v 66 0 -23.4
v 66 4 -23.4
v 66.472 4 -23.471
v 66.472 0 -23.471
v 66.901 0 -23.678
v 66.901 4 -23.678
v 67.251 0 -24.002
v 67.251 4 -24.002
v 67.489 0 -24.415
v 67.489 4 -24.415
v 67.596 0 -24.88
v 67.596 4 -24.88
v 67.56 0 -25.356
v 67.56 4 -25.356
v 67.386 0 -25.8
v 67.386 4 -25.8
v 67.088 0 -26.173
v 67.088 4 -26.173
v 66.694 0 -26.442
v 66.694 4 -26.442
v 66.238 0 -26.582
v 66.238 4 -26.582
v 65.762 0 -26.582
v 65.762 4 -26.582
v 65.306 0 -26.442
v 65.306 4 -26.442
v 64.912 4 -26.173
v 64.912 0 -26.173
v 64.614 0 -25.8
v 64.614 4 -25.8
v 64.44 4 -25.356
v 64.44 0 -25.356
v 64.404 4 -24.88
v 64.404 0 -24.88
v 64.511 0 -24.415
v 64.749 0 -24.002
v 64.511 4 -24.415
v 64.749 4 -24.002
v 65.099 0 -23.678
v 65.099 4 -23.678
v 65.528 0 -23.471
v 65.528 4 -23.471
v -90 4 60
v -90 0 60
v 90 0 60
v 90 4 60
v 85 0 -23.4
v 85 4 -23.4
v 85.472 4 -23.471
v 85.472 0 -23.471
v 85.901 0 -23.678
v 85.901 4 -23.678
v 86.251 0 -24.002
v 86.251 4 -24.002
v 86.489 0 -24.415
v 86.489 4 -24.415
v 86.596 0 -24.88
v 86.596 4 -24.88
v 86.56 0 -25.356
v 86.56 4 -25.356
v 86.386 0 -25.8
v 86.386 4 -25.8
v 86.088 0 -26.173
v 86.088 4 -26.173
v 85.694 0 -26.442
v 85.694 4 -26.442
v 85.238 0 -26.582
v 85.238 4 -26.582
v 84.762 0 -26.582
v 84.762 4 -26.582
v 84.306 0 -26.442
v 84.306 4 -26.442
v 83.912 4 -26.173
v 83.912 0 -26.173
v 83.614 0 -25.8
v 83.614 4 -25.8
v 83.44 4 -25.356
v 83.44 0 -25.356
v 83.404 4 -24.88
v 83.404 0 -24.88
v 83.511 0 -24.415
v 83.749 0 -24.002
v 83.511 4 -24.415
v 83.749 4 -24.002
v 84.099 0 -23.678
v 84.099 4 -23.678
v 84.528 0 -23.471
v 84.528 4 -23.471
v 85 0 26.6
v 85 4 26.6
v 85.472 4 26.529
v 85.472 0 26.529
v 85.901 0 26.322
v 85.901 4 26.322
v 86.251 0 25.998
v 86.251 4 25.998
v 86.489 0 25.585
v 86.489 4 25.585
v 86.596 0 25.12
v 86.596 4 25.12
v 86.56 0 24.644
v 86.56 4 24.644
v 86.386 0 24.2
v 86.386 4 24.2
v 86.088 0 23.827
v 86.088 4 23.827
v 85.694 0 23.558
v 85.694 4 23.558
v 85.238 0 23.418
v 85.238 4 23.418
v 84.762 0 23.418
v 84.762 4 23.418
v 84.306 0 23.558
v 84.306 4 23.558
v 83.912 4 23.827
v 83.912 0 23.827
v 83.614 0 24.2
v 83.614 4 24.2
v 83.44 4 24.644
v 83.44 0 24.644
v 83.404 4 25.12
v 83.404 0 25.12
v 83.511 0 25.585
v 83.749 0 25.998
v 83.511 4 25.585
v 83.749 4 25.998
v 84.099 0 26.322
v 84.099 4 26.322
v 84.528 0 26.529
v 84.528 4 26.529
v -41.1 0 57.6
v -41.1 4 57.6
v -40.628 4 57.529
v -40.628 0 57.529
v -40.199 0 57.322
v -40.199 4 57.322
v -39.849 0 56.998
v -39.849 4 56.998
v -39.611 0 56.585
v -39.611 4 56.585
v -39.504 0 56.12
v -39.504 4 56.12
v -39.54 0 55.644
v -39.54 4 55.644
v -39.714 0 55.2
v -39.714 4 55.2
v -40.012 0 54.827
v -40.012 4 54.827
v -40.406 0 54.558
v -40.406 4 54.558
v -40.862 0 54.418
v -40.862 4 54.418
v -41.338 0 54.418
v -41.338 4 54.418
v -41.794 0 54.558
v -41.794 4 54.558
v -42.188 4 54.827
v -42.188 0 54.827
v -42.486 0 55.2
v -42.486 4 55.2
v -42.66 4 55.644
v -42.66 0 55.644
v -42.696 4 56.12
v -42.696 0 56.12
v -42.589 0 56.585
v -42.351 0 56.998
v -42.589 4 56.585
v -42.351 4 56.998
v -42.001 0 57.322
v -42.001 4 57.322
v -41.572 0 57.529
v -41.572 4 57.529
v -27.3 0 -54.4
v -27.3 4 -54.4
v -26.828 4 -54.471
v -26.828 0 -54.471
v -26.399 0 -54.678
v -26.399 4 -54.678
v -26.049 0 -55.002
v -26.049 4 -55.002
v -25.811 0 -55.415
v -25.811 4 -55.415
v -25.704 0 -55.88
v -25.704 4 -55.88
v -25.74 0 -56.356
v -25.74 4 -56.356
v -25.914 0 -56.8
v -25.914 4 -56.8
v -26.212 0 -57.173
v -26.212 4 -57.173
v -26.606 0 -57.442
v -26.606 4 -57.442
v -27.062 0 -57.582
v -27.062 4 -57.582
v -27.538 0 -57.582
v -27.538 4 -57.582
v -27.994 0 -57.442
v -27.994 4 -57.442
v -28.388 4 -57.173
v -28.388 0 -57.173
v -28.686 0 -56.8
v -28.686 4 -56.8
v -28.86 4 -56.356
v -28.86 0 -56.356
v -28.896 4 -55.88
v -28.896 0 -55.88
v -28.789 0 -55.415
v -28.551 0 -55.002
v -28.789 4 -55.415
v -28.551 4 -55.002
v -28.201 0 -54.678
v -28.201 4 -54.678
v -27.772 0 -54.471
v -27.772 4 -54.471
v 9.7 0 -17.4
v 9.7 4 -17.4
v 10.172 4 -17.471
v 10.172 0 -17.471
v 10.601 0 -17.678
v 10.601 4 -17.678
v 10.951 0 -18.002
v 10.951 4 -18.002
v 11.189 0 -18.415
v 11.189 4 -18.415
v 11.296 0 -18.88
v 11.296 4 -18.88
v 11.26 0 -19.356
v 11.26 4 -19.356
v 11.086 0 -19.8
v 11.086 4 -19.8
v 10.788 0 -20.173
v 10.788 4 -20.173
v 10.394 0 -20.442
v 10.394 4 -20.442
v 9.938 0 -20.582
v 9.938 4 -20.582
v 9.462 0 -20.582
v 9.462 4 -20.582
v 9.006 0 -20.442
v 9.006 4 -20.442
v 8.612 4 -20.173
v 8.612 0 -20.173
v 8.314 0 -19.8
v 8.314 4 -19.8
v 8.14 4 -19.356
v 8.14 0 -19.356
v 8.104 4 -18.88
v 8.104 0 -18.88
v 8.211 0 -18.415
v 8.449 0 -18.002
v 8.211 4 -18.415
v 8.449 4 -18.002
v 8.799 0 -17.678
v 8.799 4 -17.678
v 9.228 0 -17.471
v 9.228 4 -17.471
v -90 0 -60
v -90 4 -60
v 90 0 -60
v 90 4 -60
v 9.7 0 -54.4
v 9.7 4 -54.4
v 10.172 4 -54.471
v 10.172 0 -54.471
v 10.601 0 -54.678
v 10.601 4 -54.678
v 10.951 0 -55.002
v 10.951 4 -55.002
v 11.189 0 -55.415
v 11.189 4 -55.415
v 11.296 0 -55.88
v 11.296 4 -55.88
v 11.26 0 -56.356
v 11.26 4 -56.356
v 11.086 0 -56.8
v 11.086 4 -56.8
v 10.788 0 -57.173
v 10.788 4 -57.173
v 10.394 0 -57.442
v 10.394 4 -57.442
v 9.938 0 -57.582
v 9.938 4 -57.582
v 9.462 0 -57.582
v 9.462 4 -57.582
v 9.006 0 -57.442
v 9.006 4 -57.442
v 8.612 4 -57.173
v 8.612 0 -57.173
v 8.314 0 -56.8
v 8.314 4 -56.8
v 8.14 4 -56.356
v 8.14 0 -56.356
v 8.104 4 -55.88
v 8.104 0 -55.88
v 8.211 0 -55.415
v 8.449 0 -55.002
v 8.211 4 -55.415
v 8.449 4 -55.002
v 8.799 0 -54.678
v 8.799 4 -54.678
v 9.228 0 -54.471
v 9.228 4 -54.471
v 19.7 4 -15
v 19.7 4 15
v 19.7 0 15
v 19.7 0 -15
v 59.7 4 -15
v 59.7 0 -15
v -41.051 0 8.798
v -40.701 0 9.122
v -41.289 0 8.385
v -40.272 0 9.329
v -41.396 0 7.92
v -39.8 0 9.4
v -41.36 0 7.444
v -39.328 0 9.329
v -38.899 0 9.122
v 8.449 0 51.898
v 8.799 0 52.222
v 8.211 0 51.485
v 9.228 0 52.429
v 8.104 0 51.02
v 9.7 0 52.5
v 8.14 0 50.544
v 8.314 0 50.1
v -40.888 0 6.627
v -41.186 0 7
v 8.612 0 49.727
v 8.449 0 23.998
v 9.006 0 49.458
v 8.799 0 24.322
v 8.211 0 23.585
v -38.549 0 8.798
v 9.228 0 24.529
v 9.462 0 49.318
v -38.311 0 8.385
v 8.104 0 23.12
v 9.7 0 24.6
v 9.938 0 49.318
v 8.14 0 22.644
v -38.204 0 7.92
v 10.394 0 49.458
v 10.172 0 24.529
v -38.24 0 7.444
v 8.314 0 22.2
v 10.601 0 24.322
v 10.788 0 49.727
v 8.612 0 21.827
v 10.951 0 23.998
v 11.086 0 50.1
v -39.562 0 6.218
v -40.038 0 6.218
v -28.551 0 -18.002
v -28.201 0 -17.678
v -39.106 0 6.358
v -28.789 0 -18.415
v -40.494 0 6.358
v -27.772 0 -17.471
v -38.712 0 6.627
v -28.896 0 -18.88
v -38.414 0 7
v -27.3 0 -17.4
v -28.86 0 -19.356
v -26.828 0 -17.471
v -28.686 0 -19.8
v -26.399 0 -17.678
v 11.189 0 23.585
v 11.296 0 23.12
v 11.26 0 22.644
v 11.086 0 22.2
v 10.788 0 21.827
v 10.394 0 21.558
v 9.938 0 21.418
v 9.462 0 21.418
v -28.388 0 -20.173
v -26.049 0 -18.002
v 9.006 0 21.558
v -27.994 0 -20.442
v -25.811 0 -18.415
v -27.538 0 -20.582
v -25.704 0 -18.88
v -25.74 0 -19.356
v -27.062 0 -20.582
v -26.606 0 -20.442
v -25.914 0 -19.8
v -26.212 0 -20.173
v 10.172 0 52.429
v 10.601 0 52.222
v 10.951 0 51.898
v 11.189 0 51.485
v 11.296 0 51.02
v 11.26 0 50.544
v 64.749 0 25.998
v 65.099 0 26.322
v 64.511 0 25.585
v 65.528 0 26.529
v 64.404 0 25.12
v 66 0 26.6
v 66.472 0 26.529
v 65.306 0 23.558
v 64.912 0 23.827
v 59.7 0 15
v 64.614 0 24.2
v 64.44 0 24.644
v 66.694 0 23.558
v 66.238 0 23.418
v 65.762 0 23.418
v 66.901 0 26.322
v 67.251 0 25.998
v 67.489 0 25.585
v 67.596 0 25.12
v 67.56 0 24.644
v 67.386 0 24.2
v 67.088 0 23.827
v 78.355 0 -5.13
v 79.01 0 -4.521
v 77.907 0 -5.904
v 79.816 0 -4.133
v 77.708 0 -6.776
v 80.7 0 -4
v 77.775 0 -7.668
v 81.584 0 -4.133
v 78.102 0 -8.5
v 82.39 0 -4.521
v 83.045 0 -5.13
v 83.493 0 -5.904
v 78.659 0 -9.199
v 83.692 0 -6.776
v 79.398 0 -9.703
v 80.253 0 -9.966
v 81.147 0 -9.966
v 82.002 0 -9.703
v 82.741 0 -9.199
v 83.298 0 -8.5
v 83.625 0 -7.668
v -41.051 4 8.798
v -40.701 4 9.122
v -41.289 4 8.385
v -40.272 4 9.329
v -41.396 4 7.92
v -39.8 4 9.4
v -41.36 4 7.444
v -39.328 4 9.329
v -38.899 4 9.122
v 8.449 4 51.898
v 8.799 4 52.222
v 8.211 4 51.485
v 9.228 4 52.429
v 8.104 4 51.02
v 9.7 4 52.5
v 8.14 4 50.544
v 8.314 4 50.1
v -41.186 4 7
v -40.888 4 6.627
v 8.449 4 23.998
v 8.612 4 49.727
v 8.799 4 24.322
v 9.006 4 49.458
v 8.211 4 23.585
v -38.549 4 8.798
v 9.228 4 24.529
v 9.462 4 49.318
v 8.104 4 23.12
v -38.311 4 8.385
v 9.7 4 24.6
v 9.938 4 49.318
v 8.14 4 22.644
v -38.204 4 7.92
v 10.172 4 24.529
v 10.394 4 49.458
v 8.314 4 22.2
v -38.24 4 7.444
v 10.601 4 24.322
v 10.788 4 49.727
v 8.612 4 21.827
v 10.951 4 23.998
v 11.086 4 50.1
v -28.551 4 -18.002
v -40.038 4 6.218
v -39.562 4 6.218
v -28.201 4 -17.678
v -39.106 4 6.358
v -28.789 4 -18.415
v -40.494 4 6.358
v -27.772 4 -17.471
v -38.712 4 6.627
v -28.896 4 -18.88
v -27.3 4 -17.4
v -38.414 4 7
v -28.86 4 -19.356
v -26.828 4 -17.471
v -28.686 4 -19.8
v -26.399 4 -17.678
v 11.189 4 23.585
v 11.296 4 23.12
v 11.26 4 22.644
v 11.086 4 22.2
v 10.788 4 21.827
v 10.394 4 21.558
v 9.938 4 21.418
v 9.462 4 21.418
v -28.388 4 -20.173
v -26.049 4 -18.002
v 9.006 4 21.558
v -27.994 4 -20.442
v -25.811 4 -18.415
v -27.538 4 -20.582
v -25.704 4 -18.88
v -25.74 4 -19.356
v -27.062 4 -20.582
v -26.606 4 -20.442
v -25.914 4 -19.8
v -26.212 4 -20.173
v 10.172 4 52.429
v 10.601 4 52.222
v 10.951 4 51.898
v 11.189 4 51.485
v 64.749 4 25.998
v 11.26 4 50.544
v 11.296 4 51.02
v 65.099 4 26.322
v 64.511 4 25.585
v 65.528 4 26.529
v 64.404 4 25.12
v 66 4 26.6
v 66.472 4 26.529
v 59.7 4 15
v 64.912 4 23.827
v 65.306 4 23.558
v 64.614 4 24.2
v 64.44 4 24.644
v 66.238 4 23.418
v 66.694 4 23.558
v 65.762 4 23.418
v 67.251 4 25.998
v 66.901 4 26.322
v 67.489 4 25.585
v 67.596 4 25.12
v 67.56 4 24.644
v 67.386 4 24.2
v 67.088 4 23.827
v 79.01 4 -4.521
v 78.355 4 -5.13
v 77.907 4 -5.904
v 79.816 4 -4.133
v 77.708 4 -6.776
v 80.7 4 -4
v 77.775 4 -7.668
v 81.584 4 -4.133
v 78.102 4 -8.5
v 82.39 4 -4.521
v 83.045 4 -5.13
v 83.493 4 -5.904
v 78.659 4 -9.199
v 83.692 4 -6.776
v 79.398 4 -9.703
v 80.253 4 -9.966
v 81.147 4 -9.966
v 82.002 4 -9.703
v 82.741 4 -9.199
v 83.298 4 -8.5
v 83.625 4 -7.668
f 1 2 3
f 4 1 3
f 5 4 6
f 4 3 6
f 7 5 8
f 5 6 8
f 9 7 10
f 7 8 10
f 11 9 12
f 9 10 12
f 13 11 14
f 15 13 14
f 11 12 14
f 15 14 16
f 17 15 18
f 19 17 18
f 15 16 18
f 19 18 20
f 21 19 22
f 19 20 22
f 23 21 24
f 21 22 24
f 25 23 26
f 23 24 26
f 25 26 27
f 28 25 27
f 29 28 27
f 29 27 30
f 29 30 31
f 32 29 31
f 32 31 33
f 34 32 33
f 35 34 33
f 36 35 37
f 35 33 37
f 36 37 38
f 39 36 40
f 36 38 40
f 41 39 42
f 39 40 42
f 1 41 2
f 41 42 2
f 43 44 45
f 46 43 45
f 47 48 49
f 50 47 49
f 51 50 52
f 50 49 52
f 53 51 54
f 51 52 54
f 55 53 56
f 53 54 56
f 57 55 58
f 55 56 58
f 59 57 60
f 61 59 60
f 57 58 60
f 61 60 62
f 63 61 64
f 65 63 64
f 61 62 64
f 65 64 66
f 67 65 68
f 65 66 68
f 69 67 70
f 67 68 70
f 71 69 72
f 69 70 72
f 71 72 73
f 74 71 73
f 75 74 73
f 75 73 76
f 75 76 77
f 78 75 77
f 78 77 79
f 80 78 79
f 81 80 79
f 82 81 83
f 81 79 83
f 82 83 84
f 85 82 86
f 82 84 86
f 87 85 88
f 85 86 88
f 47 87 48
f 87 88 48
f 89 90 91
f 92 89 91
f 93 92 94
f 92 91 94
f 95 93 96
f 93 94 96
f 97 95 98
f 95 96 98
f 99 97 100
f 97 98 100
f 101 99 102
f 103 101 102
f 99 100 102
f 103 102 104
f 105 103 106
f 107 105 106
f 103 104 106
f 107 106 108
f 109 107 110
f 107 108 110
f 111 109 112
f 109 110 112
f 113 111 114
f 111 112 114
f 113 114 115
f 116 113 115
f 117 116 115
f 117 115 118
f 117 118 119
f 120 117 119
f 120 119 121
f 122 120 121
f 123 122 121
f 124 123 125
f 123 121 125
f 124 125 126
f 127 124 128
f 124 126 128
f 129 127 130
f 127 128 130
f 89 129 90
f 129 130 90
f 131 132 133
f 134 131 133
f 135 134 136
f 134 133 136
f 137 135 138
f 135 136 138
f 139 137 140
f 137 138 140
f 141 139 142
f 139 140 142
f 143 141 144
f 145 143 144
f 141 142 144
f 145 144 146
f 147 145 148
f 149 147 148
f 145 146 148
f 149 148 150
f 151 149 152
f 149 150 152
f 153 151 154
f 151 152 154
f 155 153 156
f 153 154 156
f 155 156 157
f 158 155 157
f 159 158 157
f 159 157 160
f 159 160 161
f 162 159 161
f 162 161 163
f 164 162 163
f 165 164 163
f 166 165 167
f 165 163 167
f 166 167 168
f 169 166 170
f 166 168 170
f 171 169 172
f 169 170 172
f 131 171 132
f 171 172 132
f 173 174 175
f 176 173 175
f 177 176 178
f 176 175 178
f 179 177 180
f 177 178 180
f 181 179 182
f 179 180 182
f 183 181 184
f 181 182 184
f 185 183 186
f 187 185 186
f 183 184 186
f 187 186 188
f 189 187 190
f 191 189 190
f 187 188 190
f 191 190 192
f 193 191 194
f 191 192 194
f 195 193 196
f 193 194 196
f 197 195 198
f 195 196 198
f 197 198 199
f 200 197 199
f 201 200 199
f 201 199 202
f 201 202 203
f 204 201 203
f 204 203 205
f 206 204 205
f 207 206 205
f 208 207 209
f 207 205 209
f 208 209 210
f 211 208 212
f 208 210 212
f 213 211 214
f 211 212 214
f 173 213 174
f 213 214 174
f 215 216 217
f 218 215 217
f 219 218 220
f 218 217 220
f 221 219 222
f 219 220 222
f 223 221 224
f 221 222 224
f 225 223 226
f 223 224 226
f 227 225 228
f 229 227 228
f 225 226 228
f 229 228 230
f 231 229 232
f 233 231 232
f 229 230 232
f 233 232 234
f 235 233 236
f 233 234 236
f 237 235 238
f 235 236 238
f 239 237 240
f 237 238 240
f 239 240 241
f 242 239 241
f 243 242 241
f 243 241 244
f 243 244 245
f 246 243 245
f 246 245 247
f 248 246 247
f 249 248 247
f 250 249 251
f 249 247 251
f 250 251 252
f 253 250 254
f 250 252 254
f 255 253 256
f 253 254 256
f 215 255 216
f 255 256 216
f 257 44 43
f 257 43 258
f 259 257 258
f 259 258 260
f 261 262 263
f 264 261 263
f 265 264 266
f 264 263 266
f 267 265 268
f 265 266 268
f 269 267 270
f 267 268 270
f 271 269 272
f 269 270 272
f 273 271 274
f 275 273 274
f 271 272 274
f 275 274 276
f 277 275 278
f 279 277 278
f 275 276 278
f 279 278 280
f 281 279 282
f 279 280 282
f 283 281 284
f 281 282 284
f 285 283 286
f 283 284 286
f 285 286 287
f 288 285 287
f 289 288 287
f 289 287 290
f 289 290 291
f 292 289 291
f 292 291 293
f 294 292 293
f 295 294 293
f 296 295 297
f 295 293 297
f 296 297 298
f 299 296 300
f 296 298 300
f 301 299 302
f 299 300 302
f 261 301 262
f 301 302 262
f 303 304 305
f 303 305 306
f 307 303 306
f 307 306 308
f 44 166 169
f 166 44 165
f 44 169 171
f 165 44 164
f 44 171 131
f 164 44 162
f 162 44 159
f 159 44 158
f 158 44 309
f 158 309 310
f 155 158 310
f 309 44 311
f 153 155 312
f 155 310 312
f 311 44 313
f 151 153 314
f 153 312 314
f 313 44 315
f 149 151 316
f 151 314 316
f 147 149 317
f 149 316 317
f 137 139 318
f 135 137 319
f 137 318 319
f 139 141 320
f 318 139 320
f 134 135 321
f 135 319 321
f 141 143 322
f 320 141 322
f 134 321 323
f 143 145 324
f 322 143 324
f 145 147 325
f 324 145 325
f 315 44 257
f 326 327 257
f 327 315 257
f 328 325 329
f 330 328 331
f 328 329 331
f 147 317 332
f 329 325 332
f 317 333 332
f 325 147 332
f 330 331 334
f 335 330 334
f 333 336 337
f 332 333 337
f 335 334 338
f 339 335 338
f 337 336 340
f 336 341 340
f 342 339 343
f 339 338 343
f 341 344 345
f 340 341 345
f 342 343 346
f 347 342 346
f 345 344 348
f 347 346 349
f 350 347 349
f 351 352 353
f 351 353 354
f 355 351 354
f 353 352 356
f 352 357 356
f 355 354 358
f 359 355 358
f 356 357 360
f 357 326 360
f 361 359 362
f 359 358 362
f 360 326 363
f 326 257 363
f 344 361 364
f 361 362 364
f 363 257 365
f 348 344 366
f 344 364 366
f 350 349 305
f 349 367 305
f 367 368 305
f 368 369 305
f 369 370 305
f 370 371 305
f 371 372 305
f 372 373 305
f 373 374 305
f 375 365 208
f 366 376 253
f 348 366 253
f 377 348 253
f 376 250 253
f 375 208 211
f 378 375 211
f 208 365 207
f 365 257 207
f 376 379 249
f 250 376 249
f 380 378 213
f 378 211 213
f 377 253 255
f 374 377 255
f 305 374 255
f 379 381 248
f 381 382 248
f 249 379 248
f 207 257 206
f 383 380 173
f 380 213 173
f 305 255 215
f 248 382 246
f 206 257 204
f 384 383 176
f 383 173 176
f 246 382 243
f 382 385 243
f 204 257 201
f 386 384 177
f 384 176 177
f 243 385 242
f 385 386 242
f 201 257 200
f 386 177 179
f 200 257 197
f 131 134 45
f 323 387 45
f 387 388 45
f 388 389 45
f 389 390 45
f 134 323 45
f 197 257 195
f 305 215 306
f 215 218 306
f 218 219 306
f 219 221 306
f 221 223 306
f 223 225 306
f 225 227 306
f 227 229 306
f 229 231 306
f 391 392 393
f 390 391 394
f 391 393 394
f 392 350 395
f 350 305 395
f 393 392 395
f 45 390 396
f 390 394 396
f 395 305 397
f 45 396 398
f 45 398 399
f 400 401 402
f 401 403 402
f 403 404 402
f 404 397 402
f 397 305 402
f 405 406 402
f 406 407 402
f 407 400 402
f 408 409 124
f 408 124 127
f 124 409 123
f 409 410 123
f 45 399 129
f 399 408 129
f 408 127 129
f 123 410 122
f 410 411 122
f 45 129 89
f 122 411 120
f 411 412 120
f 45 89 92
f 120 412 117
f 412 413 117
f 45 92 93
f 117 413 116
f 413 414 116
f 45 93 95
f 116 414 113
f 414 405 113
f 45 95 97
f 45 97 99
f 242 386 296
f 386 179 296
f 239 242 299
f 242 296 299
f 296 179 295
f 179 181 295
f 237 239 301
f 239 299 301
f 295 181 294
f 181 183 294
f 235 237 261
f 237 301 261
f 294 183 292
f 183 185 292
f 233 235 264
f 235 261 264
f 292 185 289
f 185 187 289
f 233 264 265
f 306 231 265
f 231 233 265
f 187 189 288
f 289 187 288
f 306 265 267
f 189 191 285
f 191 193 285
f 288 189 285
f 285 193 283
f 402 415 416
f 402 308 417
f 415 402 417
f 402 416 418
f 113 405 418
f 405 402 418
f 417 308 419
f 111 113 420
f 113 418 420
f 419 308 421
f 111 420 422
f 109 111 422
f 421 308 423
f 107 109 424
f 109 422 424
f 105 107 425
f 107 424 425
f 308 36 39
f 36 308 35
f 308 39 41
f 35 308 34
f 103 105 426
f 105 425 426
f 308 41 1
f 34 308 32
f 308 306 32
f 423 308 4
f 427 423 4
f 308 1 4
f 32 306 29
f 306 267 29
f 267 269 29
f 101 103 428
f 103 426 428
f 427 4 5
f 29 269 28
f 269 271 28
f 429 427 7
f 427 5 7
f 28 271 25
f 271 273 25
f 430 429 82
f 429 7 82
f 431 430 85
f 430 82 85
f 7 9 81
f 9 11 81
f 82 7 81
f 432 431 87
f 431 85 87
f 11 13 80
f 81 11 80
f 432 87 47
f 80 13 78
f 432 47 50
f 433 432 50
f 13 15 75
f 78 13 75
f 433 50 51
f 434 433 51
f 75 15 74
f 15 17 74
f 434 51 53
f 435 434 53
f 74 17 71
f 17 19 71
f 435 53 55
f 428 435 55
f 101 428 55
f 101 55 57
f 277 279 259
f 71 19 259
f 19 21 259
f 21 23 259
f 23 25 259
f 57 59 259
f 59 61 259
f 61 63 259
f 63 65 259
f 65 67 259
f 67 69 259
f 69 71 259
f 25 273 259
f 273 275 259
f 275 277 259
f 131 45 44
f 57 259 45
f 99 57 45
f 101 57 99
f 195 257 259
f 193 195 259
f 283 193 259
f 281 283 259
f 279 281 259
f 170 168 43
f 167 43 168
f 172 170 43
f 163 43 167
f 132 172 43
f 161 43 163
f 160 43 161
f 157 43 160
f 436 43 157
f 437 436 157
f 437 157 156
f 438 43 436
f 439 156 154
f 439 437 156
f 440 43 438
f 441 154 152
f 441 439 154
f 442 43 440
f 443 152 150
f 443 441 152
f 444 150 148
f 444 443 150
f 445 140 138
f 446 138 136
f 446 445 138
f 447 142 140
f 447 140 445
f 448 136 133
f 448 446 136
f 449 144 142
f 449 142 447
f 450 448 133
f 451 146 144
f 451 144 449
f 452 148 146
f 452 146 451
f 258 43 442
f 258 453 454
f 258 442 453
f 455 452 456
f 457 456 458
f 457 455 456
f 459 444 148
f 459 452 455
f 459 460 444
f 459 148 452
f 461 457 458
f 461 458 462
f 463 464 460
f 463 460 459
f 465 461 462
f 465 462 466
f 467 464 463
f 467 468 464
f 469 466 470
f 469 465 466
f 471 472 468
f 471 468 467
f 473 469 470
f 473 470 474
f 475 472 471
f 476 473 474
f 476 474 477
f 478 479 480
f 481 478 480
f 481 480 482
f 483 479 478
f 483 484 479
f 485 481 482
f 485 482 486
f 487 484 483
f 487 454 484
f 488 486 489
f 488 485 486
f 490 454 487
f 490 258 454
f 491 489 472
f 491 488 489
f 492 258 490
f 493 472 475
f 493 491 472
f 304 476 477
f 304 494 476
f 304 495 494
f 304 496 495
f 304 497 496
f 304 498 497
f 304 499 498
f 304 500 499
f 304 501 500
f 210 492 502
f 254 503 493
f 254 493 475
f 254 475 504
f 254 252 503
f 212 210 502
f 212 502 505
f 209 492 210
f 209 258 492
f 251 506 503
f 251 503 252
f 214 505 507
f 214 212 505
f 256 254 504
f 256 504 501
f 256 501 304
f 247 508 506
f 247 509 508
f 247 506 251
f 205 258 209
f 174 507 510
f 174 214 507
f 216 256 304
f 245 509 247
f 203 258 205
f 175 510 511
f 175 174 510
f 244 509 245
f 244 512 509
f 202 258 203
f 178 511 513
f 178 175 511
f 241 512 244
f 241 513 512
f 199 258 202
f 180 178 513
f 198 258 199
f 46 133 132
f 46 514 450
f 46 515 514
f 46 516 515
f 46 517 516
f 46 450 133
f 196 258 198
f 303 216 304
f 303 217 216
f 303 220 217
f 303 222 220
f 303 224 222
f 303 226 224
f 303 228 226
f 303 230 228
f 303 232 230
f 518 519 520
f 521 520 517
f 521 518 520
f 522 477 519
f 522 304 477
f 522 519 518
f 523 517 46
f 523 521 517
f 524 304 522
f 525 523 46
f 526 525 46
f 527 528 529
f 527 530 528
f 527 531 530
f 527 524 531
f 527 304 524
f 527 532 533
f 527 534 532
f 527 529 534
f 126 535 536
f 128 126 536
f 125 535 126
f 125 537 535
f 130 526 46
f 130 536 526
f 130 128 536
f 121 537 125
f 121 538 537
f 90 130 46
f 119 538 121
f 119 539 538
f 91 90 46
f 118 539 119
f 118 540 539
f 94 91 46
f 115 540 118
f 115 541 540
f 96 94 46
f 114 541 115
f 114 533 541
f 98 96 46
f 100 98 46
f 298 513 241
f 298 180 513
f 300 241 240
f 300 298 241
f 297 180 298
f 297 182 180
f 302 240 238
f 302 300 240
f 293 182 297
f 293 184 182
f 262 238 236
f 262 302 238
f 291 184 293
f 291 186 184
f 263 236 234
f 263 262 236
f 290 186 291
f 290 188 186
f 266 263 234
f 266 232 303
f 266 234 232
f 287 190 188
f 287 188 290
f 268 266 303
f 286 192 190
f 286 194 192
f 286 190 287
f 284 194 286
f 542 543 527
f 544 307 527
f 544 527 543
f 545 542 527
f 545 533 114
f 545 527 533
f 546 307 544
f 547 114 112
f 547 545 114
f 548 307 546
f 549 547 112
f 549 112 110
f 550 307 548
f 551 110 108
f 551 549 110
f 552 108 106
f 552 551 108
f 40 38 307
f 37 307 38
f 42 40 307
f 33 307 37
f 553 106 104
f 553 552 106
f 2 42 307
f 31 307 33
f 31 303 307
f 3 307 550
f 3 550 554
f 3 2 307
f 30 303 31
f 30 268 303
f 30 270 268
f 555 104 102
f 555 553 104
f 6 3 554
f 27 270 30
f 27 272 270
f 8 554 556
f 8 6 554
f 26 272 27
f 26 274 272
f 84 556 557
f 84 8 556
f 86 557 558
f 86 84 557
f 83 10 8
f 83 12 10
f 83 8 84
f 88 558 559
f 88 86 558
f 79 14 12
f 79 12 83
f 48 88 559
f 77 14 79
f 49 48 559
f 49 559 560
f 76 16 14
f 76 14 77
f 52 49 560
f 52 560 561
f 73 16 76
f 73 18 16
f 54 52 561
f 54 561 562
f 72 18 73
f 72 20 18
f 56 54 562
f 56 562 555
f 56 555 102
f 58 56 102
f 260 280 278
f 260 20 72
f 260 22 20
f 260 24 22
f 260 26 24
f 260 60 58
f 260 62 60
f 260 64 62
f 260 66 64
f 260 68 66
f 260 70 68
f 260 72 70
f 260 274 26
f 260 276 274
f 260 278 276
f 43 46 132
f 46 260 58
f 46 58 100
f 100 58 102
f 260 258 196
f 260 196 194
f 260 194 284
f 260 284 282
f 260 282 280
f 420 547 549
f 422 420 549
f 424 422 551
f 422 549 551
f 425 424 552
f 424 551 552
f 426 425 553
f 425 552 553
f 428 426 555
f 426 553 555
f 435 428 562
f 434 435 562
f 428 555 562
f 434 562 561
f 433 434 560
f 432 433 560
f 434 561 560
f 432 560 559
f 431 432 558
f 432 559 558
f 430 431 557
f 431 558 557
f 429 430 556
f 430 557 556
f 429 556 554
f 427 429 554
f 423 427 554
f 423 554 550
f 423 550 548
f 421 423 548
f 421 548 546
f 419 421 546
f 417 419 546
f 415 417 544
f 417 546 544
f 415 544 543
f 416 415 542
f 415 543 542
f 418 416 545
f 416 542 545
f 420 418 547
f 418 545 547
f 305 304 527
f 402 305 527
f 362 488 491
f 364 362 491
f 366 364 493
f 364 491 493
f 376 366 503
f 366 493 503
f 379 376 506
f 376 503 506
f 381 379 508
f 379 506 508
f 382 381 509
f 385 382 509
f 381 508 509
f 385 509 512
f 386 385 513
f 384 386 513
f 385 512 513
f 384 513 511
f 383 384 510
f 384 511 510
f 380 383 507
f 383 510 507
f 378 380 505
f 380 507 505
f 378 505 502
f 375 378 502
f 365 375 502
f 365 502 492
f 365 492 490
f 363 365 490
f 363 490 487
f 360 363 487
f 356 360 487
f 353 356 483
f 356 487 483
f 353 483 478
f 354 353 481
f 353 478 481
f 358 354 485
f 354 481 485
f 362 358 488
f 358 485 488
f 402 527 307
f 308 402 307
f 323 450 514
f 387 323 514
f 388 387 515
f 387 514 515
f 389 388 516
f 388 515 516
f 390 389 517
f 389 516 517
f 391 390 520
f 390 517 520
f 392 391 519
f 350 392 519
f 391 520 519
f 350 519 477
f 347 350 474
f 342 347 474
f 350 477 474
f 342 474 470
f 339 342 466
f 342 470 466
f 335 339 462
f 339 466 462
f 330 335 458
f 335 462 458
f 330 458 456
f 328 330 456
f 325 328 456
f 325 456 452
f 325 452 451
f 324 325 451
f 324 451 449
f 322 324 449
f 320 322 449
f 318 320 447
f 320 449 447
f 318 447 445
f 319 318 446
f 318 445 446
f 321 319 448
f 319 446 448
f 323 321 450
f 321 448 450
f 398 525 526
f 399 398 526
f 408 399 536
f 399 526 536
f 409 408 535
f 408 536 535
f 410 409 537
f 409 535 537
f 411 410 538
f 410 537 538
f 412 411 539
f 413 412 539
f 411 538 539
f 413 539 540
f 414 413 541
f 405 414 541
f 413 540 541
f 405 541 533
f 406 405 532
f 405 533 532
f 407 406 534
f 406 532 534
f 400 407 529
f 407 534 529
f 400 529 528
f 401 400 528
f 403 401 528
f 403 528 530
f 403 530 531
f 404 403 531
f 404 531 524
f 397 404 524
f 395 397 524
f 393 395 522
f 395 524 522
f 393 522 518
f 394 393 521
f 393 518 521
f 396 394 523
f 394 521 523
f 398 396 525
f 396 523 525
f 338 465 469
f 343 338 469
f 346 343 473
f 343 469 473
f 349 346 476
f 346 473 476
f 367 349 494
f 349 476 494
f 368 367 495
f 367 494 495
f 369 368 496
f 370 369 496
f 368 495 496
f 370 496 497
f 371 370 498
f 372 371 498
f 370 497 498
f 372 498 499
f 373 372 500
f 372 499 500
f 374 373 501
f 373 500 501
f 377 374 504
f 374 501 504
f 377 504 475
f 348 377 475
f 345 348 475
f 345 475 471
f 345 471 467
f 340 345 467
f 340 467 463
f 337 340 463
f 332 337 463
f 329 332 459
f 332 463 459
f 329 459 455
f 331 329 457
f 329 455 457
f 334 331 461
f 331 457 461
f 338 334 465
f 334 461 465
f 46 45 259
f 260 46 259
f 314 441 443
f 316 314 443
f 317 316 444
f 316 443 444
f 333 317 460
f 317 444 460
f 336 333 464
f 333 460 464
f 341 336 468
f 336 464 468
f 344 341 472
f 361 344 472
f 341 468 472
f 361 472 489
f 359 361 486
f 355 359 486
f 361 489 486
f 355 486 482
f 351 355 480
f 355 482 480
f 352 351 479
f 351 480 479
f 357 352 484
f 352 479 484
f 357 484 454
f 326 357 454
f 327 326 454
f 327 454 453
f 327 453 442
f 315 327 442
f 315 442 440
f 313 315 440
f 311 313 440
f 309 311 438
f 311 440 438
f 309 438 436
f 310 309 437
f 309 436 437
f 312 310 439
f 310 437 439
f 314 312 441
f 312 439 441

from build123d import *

# Parameters (mm, degrees)
SKETCH_1_W          = 180
SKETCH_1_H          = 120
EXTRUDE_1_DEPTH     = 4
SKETCH_2_R          = 1.6
SKETCH_2_R_2        = 3
CUT_EXTRUDE_1_DEPTH = 4
SKETCH_3_W          = 40
SKETCH_3_H          = 30
CUT_EXTRUDE_2_DEPTH = 4
SKETCH_4_R          = 1.6
CUT_EXTRUDE_3_DEPTH = 4
SKETCH_5_R          = 1.6
CUT_EXTRUDE_4_DEPTH = 4


with BuildPart() as part:
    # 草图1 → 凸台-拉伸1 (new body)
    with BuildSketch(Plane(origin=(0, 0, 0), x_dir=(1, 0, 0), z_dir=(0, 1, 0))):
        Rectangle(SKETCH_1_W, SKETCH_1_H)
    extrude(amount=EXTRUDE_1_DEPTH)

    # 草图2 → 切除-拉伸1 (cut)
    with BuildSketch(Plane(origin=(0, 4, 0), x_dir=(1, 0, 0), z_dir=(0, 1, 0))):
        with Locations(Location((66, 25, 0), (0, 0, 270))):
            Circle(SKETCH_2_R)
        with Locations(Location((66, -25, 0), (0, 0, 270))):
            Circle(SKETCH_2_R)
        with Locations(Location((85, -25, 0), (0, 0, 270))):
            Circle(SKETCH_2_R)
        with Locations(Location((85, 25, 0), (0, 0, 270))):
            Circle(SKETCH_2_R)
        with Locations(Location((80.7, 7, 0), (0, 0, 270))):
            Circle(SKETCH_2_R_2)
    extrude(amount=-CUT_EXTRUDE_1_DEPTH, mode=Mode.SUBTRACT)

    # 草图3 → 切除-拉伸2 (cut)
    with BuildSketch(Plane(origin=(0, 4, 0), x_dir=(1, 0, 0), z_dir=(0, 1, 0))):
        with Locations((39.7, 0)):
            Rectangle(SKETCH_3_W, SKETCH_3_H)
    extrude(amount=-CUT_EXTRUDE_2_DEPTH, mode=Mode.SUBTRACT)

    # 草图4 → 切除-拉伸3 (cut)
    with BuildSketch(Plane(origin=(0, 4, 0), x_dir=(1, 0, 0), z_dir=(0, 1, 0))):
        with Locations(Location((-27.3, 56, 0), (0, 0, 270))):
            Circle(SKETCH_4_R)
        with Locations(Location((9.7, 56, 0), (0, 0, 270))):
            Circle(SKETCH_4_R)
        with Locations(Location((9.7, 19, 0), (0, 0, 270))):
            Circle(SKETCH_4_R)
        with Locations(Location((-27.3, 19, 0), (0, 0, 270))):
            Circle(SKETCH_4_R)
    extrude(amount=-CUT_EXTRUDE_3_DEPTH, mode=Mode.SUBTRACT)

    # 草图5 → 切除-拉伸4 (cut)
    with BuildSketch(Plane(origin=(0, 4, 0), x_dir=(1, 0, 0), z_dir=(0, 1, 0))):
        with Locations(Location((-39.8, -7.8, 0), (0, 0, 270))):
            Circle(SKETCH_5_R)
        with Locations(Location((9.7, -23, 0), (0, 0, 270))):
            Circle(SKETCH_5_R)
        with Locations(Location((9.7, -50.9, 0), (0, 0, 270))):
            Circle(SKETCH_5_R)
        with Locations(Location((-41.1, -56, 0), (0, 0, 270))):
            Circle(SKETCH_5_R)
    extrude(amount=-CUT_EXTRUDE_4_DEPTH, mode=Mode.SUBTRACT)


solid = part.part
